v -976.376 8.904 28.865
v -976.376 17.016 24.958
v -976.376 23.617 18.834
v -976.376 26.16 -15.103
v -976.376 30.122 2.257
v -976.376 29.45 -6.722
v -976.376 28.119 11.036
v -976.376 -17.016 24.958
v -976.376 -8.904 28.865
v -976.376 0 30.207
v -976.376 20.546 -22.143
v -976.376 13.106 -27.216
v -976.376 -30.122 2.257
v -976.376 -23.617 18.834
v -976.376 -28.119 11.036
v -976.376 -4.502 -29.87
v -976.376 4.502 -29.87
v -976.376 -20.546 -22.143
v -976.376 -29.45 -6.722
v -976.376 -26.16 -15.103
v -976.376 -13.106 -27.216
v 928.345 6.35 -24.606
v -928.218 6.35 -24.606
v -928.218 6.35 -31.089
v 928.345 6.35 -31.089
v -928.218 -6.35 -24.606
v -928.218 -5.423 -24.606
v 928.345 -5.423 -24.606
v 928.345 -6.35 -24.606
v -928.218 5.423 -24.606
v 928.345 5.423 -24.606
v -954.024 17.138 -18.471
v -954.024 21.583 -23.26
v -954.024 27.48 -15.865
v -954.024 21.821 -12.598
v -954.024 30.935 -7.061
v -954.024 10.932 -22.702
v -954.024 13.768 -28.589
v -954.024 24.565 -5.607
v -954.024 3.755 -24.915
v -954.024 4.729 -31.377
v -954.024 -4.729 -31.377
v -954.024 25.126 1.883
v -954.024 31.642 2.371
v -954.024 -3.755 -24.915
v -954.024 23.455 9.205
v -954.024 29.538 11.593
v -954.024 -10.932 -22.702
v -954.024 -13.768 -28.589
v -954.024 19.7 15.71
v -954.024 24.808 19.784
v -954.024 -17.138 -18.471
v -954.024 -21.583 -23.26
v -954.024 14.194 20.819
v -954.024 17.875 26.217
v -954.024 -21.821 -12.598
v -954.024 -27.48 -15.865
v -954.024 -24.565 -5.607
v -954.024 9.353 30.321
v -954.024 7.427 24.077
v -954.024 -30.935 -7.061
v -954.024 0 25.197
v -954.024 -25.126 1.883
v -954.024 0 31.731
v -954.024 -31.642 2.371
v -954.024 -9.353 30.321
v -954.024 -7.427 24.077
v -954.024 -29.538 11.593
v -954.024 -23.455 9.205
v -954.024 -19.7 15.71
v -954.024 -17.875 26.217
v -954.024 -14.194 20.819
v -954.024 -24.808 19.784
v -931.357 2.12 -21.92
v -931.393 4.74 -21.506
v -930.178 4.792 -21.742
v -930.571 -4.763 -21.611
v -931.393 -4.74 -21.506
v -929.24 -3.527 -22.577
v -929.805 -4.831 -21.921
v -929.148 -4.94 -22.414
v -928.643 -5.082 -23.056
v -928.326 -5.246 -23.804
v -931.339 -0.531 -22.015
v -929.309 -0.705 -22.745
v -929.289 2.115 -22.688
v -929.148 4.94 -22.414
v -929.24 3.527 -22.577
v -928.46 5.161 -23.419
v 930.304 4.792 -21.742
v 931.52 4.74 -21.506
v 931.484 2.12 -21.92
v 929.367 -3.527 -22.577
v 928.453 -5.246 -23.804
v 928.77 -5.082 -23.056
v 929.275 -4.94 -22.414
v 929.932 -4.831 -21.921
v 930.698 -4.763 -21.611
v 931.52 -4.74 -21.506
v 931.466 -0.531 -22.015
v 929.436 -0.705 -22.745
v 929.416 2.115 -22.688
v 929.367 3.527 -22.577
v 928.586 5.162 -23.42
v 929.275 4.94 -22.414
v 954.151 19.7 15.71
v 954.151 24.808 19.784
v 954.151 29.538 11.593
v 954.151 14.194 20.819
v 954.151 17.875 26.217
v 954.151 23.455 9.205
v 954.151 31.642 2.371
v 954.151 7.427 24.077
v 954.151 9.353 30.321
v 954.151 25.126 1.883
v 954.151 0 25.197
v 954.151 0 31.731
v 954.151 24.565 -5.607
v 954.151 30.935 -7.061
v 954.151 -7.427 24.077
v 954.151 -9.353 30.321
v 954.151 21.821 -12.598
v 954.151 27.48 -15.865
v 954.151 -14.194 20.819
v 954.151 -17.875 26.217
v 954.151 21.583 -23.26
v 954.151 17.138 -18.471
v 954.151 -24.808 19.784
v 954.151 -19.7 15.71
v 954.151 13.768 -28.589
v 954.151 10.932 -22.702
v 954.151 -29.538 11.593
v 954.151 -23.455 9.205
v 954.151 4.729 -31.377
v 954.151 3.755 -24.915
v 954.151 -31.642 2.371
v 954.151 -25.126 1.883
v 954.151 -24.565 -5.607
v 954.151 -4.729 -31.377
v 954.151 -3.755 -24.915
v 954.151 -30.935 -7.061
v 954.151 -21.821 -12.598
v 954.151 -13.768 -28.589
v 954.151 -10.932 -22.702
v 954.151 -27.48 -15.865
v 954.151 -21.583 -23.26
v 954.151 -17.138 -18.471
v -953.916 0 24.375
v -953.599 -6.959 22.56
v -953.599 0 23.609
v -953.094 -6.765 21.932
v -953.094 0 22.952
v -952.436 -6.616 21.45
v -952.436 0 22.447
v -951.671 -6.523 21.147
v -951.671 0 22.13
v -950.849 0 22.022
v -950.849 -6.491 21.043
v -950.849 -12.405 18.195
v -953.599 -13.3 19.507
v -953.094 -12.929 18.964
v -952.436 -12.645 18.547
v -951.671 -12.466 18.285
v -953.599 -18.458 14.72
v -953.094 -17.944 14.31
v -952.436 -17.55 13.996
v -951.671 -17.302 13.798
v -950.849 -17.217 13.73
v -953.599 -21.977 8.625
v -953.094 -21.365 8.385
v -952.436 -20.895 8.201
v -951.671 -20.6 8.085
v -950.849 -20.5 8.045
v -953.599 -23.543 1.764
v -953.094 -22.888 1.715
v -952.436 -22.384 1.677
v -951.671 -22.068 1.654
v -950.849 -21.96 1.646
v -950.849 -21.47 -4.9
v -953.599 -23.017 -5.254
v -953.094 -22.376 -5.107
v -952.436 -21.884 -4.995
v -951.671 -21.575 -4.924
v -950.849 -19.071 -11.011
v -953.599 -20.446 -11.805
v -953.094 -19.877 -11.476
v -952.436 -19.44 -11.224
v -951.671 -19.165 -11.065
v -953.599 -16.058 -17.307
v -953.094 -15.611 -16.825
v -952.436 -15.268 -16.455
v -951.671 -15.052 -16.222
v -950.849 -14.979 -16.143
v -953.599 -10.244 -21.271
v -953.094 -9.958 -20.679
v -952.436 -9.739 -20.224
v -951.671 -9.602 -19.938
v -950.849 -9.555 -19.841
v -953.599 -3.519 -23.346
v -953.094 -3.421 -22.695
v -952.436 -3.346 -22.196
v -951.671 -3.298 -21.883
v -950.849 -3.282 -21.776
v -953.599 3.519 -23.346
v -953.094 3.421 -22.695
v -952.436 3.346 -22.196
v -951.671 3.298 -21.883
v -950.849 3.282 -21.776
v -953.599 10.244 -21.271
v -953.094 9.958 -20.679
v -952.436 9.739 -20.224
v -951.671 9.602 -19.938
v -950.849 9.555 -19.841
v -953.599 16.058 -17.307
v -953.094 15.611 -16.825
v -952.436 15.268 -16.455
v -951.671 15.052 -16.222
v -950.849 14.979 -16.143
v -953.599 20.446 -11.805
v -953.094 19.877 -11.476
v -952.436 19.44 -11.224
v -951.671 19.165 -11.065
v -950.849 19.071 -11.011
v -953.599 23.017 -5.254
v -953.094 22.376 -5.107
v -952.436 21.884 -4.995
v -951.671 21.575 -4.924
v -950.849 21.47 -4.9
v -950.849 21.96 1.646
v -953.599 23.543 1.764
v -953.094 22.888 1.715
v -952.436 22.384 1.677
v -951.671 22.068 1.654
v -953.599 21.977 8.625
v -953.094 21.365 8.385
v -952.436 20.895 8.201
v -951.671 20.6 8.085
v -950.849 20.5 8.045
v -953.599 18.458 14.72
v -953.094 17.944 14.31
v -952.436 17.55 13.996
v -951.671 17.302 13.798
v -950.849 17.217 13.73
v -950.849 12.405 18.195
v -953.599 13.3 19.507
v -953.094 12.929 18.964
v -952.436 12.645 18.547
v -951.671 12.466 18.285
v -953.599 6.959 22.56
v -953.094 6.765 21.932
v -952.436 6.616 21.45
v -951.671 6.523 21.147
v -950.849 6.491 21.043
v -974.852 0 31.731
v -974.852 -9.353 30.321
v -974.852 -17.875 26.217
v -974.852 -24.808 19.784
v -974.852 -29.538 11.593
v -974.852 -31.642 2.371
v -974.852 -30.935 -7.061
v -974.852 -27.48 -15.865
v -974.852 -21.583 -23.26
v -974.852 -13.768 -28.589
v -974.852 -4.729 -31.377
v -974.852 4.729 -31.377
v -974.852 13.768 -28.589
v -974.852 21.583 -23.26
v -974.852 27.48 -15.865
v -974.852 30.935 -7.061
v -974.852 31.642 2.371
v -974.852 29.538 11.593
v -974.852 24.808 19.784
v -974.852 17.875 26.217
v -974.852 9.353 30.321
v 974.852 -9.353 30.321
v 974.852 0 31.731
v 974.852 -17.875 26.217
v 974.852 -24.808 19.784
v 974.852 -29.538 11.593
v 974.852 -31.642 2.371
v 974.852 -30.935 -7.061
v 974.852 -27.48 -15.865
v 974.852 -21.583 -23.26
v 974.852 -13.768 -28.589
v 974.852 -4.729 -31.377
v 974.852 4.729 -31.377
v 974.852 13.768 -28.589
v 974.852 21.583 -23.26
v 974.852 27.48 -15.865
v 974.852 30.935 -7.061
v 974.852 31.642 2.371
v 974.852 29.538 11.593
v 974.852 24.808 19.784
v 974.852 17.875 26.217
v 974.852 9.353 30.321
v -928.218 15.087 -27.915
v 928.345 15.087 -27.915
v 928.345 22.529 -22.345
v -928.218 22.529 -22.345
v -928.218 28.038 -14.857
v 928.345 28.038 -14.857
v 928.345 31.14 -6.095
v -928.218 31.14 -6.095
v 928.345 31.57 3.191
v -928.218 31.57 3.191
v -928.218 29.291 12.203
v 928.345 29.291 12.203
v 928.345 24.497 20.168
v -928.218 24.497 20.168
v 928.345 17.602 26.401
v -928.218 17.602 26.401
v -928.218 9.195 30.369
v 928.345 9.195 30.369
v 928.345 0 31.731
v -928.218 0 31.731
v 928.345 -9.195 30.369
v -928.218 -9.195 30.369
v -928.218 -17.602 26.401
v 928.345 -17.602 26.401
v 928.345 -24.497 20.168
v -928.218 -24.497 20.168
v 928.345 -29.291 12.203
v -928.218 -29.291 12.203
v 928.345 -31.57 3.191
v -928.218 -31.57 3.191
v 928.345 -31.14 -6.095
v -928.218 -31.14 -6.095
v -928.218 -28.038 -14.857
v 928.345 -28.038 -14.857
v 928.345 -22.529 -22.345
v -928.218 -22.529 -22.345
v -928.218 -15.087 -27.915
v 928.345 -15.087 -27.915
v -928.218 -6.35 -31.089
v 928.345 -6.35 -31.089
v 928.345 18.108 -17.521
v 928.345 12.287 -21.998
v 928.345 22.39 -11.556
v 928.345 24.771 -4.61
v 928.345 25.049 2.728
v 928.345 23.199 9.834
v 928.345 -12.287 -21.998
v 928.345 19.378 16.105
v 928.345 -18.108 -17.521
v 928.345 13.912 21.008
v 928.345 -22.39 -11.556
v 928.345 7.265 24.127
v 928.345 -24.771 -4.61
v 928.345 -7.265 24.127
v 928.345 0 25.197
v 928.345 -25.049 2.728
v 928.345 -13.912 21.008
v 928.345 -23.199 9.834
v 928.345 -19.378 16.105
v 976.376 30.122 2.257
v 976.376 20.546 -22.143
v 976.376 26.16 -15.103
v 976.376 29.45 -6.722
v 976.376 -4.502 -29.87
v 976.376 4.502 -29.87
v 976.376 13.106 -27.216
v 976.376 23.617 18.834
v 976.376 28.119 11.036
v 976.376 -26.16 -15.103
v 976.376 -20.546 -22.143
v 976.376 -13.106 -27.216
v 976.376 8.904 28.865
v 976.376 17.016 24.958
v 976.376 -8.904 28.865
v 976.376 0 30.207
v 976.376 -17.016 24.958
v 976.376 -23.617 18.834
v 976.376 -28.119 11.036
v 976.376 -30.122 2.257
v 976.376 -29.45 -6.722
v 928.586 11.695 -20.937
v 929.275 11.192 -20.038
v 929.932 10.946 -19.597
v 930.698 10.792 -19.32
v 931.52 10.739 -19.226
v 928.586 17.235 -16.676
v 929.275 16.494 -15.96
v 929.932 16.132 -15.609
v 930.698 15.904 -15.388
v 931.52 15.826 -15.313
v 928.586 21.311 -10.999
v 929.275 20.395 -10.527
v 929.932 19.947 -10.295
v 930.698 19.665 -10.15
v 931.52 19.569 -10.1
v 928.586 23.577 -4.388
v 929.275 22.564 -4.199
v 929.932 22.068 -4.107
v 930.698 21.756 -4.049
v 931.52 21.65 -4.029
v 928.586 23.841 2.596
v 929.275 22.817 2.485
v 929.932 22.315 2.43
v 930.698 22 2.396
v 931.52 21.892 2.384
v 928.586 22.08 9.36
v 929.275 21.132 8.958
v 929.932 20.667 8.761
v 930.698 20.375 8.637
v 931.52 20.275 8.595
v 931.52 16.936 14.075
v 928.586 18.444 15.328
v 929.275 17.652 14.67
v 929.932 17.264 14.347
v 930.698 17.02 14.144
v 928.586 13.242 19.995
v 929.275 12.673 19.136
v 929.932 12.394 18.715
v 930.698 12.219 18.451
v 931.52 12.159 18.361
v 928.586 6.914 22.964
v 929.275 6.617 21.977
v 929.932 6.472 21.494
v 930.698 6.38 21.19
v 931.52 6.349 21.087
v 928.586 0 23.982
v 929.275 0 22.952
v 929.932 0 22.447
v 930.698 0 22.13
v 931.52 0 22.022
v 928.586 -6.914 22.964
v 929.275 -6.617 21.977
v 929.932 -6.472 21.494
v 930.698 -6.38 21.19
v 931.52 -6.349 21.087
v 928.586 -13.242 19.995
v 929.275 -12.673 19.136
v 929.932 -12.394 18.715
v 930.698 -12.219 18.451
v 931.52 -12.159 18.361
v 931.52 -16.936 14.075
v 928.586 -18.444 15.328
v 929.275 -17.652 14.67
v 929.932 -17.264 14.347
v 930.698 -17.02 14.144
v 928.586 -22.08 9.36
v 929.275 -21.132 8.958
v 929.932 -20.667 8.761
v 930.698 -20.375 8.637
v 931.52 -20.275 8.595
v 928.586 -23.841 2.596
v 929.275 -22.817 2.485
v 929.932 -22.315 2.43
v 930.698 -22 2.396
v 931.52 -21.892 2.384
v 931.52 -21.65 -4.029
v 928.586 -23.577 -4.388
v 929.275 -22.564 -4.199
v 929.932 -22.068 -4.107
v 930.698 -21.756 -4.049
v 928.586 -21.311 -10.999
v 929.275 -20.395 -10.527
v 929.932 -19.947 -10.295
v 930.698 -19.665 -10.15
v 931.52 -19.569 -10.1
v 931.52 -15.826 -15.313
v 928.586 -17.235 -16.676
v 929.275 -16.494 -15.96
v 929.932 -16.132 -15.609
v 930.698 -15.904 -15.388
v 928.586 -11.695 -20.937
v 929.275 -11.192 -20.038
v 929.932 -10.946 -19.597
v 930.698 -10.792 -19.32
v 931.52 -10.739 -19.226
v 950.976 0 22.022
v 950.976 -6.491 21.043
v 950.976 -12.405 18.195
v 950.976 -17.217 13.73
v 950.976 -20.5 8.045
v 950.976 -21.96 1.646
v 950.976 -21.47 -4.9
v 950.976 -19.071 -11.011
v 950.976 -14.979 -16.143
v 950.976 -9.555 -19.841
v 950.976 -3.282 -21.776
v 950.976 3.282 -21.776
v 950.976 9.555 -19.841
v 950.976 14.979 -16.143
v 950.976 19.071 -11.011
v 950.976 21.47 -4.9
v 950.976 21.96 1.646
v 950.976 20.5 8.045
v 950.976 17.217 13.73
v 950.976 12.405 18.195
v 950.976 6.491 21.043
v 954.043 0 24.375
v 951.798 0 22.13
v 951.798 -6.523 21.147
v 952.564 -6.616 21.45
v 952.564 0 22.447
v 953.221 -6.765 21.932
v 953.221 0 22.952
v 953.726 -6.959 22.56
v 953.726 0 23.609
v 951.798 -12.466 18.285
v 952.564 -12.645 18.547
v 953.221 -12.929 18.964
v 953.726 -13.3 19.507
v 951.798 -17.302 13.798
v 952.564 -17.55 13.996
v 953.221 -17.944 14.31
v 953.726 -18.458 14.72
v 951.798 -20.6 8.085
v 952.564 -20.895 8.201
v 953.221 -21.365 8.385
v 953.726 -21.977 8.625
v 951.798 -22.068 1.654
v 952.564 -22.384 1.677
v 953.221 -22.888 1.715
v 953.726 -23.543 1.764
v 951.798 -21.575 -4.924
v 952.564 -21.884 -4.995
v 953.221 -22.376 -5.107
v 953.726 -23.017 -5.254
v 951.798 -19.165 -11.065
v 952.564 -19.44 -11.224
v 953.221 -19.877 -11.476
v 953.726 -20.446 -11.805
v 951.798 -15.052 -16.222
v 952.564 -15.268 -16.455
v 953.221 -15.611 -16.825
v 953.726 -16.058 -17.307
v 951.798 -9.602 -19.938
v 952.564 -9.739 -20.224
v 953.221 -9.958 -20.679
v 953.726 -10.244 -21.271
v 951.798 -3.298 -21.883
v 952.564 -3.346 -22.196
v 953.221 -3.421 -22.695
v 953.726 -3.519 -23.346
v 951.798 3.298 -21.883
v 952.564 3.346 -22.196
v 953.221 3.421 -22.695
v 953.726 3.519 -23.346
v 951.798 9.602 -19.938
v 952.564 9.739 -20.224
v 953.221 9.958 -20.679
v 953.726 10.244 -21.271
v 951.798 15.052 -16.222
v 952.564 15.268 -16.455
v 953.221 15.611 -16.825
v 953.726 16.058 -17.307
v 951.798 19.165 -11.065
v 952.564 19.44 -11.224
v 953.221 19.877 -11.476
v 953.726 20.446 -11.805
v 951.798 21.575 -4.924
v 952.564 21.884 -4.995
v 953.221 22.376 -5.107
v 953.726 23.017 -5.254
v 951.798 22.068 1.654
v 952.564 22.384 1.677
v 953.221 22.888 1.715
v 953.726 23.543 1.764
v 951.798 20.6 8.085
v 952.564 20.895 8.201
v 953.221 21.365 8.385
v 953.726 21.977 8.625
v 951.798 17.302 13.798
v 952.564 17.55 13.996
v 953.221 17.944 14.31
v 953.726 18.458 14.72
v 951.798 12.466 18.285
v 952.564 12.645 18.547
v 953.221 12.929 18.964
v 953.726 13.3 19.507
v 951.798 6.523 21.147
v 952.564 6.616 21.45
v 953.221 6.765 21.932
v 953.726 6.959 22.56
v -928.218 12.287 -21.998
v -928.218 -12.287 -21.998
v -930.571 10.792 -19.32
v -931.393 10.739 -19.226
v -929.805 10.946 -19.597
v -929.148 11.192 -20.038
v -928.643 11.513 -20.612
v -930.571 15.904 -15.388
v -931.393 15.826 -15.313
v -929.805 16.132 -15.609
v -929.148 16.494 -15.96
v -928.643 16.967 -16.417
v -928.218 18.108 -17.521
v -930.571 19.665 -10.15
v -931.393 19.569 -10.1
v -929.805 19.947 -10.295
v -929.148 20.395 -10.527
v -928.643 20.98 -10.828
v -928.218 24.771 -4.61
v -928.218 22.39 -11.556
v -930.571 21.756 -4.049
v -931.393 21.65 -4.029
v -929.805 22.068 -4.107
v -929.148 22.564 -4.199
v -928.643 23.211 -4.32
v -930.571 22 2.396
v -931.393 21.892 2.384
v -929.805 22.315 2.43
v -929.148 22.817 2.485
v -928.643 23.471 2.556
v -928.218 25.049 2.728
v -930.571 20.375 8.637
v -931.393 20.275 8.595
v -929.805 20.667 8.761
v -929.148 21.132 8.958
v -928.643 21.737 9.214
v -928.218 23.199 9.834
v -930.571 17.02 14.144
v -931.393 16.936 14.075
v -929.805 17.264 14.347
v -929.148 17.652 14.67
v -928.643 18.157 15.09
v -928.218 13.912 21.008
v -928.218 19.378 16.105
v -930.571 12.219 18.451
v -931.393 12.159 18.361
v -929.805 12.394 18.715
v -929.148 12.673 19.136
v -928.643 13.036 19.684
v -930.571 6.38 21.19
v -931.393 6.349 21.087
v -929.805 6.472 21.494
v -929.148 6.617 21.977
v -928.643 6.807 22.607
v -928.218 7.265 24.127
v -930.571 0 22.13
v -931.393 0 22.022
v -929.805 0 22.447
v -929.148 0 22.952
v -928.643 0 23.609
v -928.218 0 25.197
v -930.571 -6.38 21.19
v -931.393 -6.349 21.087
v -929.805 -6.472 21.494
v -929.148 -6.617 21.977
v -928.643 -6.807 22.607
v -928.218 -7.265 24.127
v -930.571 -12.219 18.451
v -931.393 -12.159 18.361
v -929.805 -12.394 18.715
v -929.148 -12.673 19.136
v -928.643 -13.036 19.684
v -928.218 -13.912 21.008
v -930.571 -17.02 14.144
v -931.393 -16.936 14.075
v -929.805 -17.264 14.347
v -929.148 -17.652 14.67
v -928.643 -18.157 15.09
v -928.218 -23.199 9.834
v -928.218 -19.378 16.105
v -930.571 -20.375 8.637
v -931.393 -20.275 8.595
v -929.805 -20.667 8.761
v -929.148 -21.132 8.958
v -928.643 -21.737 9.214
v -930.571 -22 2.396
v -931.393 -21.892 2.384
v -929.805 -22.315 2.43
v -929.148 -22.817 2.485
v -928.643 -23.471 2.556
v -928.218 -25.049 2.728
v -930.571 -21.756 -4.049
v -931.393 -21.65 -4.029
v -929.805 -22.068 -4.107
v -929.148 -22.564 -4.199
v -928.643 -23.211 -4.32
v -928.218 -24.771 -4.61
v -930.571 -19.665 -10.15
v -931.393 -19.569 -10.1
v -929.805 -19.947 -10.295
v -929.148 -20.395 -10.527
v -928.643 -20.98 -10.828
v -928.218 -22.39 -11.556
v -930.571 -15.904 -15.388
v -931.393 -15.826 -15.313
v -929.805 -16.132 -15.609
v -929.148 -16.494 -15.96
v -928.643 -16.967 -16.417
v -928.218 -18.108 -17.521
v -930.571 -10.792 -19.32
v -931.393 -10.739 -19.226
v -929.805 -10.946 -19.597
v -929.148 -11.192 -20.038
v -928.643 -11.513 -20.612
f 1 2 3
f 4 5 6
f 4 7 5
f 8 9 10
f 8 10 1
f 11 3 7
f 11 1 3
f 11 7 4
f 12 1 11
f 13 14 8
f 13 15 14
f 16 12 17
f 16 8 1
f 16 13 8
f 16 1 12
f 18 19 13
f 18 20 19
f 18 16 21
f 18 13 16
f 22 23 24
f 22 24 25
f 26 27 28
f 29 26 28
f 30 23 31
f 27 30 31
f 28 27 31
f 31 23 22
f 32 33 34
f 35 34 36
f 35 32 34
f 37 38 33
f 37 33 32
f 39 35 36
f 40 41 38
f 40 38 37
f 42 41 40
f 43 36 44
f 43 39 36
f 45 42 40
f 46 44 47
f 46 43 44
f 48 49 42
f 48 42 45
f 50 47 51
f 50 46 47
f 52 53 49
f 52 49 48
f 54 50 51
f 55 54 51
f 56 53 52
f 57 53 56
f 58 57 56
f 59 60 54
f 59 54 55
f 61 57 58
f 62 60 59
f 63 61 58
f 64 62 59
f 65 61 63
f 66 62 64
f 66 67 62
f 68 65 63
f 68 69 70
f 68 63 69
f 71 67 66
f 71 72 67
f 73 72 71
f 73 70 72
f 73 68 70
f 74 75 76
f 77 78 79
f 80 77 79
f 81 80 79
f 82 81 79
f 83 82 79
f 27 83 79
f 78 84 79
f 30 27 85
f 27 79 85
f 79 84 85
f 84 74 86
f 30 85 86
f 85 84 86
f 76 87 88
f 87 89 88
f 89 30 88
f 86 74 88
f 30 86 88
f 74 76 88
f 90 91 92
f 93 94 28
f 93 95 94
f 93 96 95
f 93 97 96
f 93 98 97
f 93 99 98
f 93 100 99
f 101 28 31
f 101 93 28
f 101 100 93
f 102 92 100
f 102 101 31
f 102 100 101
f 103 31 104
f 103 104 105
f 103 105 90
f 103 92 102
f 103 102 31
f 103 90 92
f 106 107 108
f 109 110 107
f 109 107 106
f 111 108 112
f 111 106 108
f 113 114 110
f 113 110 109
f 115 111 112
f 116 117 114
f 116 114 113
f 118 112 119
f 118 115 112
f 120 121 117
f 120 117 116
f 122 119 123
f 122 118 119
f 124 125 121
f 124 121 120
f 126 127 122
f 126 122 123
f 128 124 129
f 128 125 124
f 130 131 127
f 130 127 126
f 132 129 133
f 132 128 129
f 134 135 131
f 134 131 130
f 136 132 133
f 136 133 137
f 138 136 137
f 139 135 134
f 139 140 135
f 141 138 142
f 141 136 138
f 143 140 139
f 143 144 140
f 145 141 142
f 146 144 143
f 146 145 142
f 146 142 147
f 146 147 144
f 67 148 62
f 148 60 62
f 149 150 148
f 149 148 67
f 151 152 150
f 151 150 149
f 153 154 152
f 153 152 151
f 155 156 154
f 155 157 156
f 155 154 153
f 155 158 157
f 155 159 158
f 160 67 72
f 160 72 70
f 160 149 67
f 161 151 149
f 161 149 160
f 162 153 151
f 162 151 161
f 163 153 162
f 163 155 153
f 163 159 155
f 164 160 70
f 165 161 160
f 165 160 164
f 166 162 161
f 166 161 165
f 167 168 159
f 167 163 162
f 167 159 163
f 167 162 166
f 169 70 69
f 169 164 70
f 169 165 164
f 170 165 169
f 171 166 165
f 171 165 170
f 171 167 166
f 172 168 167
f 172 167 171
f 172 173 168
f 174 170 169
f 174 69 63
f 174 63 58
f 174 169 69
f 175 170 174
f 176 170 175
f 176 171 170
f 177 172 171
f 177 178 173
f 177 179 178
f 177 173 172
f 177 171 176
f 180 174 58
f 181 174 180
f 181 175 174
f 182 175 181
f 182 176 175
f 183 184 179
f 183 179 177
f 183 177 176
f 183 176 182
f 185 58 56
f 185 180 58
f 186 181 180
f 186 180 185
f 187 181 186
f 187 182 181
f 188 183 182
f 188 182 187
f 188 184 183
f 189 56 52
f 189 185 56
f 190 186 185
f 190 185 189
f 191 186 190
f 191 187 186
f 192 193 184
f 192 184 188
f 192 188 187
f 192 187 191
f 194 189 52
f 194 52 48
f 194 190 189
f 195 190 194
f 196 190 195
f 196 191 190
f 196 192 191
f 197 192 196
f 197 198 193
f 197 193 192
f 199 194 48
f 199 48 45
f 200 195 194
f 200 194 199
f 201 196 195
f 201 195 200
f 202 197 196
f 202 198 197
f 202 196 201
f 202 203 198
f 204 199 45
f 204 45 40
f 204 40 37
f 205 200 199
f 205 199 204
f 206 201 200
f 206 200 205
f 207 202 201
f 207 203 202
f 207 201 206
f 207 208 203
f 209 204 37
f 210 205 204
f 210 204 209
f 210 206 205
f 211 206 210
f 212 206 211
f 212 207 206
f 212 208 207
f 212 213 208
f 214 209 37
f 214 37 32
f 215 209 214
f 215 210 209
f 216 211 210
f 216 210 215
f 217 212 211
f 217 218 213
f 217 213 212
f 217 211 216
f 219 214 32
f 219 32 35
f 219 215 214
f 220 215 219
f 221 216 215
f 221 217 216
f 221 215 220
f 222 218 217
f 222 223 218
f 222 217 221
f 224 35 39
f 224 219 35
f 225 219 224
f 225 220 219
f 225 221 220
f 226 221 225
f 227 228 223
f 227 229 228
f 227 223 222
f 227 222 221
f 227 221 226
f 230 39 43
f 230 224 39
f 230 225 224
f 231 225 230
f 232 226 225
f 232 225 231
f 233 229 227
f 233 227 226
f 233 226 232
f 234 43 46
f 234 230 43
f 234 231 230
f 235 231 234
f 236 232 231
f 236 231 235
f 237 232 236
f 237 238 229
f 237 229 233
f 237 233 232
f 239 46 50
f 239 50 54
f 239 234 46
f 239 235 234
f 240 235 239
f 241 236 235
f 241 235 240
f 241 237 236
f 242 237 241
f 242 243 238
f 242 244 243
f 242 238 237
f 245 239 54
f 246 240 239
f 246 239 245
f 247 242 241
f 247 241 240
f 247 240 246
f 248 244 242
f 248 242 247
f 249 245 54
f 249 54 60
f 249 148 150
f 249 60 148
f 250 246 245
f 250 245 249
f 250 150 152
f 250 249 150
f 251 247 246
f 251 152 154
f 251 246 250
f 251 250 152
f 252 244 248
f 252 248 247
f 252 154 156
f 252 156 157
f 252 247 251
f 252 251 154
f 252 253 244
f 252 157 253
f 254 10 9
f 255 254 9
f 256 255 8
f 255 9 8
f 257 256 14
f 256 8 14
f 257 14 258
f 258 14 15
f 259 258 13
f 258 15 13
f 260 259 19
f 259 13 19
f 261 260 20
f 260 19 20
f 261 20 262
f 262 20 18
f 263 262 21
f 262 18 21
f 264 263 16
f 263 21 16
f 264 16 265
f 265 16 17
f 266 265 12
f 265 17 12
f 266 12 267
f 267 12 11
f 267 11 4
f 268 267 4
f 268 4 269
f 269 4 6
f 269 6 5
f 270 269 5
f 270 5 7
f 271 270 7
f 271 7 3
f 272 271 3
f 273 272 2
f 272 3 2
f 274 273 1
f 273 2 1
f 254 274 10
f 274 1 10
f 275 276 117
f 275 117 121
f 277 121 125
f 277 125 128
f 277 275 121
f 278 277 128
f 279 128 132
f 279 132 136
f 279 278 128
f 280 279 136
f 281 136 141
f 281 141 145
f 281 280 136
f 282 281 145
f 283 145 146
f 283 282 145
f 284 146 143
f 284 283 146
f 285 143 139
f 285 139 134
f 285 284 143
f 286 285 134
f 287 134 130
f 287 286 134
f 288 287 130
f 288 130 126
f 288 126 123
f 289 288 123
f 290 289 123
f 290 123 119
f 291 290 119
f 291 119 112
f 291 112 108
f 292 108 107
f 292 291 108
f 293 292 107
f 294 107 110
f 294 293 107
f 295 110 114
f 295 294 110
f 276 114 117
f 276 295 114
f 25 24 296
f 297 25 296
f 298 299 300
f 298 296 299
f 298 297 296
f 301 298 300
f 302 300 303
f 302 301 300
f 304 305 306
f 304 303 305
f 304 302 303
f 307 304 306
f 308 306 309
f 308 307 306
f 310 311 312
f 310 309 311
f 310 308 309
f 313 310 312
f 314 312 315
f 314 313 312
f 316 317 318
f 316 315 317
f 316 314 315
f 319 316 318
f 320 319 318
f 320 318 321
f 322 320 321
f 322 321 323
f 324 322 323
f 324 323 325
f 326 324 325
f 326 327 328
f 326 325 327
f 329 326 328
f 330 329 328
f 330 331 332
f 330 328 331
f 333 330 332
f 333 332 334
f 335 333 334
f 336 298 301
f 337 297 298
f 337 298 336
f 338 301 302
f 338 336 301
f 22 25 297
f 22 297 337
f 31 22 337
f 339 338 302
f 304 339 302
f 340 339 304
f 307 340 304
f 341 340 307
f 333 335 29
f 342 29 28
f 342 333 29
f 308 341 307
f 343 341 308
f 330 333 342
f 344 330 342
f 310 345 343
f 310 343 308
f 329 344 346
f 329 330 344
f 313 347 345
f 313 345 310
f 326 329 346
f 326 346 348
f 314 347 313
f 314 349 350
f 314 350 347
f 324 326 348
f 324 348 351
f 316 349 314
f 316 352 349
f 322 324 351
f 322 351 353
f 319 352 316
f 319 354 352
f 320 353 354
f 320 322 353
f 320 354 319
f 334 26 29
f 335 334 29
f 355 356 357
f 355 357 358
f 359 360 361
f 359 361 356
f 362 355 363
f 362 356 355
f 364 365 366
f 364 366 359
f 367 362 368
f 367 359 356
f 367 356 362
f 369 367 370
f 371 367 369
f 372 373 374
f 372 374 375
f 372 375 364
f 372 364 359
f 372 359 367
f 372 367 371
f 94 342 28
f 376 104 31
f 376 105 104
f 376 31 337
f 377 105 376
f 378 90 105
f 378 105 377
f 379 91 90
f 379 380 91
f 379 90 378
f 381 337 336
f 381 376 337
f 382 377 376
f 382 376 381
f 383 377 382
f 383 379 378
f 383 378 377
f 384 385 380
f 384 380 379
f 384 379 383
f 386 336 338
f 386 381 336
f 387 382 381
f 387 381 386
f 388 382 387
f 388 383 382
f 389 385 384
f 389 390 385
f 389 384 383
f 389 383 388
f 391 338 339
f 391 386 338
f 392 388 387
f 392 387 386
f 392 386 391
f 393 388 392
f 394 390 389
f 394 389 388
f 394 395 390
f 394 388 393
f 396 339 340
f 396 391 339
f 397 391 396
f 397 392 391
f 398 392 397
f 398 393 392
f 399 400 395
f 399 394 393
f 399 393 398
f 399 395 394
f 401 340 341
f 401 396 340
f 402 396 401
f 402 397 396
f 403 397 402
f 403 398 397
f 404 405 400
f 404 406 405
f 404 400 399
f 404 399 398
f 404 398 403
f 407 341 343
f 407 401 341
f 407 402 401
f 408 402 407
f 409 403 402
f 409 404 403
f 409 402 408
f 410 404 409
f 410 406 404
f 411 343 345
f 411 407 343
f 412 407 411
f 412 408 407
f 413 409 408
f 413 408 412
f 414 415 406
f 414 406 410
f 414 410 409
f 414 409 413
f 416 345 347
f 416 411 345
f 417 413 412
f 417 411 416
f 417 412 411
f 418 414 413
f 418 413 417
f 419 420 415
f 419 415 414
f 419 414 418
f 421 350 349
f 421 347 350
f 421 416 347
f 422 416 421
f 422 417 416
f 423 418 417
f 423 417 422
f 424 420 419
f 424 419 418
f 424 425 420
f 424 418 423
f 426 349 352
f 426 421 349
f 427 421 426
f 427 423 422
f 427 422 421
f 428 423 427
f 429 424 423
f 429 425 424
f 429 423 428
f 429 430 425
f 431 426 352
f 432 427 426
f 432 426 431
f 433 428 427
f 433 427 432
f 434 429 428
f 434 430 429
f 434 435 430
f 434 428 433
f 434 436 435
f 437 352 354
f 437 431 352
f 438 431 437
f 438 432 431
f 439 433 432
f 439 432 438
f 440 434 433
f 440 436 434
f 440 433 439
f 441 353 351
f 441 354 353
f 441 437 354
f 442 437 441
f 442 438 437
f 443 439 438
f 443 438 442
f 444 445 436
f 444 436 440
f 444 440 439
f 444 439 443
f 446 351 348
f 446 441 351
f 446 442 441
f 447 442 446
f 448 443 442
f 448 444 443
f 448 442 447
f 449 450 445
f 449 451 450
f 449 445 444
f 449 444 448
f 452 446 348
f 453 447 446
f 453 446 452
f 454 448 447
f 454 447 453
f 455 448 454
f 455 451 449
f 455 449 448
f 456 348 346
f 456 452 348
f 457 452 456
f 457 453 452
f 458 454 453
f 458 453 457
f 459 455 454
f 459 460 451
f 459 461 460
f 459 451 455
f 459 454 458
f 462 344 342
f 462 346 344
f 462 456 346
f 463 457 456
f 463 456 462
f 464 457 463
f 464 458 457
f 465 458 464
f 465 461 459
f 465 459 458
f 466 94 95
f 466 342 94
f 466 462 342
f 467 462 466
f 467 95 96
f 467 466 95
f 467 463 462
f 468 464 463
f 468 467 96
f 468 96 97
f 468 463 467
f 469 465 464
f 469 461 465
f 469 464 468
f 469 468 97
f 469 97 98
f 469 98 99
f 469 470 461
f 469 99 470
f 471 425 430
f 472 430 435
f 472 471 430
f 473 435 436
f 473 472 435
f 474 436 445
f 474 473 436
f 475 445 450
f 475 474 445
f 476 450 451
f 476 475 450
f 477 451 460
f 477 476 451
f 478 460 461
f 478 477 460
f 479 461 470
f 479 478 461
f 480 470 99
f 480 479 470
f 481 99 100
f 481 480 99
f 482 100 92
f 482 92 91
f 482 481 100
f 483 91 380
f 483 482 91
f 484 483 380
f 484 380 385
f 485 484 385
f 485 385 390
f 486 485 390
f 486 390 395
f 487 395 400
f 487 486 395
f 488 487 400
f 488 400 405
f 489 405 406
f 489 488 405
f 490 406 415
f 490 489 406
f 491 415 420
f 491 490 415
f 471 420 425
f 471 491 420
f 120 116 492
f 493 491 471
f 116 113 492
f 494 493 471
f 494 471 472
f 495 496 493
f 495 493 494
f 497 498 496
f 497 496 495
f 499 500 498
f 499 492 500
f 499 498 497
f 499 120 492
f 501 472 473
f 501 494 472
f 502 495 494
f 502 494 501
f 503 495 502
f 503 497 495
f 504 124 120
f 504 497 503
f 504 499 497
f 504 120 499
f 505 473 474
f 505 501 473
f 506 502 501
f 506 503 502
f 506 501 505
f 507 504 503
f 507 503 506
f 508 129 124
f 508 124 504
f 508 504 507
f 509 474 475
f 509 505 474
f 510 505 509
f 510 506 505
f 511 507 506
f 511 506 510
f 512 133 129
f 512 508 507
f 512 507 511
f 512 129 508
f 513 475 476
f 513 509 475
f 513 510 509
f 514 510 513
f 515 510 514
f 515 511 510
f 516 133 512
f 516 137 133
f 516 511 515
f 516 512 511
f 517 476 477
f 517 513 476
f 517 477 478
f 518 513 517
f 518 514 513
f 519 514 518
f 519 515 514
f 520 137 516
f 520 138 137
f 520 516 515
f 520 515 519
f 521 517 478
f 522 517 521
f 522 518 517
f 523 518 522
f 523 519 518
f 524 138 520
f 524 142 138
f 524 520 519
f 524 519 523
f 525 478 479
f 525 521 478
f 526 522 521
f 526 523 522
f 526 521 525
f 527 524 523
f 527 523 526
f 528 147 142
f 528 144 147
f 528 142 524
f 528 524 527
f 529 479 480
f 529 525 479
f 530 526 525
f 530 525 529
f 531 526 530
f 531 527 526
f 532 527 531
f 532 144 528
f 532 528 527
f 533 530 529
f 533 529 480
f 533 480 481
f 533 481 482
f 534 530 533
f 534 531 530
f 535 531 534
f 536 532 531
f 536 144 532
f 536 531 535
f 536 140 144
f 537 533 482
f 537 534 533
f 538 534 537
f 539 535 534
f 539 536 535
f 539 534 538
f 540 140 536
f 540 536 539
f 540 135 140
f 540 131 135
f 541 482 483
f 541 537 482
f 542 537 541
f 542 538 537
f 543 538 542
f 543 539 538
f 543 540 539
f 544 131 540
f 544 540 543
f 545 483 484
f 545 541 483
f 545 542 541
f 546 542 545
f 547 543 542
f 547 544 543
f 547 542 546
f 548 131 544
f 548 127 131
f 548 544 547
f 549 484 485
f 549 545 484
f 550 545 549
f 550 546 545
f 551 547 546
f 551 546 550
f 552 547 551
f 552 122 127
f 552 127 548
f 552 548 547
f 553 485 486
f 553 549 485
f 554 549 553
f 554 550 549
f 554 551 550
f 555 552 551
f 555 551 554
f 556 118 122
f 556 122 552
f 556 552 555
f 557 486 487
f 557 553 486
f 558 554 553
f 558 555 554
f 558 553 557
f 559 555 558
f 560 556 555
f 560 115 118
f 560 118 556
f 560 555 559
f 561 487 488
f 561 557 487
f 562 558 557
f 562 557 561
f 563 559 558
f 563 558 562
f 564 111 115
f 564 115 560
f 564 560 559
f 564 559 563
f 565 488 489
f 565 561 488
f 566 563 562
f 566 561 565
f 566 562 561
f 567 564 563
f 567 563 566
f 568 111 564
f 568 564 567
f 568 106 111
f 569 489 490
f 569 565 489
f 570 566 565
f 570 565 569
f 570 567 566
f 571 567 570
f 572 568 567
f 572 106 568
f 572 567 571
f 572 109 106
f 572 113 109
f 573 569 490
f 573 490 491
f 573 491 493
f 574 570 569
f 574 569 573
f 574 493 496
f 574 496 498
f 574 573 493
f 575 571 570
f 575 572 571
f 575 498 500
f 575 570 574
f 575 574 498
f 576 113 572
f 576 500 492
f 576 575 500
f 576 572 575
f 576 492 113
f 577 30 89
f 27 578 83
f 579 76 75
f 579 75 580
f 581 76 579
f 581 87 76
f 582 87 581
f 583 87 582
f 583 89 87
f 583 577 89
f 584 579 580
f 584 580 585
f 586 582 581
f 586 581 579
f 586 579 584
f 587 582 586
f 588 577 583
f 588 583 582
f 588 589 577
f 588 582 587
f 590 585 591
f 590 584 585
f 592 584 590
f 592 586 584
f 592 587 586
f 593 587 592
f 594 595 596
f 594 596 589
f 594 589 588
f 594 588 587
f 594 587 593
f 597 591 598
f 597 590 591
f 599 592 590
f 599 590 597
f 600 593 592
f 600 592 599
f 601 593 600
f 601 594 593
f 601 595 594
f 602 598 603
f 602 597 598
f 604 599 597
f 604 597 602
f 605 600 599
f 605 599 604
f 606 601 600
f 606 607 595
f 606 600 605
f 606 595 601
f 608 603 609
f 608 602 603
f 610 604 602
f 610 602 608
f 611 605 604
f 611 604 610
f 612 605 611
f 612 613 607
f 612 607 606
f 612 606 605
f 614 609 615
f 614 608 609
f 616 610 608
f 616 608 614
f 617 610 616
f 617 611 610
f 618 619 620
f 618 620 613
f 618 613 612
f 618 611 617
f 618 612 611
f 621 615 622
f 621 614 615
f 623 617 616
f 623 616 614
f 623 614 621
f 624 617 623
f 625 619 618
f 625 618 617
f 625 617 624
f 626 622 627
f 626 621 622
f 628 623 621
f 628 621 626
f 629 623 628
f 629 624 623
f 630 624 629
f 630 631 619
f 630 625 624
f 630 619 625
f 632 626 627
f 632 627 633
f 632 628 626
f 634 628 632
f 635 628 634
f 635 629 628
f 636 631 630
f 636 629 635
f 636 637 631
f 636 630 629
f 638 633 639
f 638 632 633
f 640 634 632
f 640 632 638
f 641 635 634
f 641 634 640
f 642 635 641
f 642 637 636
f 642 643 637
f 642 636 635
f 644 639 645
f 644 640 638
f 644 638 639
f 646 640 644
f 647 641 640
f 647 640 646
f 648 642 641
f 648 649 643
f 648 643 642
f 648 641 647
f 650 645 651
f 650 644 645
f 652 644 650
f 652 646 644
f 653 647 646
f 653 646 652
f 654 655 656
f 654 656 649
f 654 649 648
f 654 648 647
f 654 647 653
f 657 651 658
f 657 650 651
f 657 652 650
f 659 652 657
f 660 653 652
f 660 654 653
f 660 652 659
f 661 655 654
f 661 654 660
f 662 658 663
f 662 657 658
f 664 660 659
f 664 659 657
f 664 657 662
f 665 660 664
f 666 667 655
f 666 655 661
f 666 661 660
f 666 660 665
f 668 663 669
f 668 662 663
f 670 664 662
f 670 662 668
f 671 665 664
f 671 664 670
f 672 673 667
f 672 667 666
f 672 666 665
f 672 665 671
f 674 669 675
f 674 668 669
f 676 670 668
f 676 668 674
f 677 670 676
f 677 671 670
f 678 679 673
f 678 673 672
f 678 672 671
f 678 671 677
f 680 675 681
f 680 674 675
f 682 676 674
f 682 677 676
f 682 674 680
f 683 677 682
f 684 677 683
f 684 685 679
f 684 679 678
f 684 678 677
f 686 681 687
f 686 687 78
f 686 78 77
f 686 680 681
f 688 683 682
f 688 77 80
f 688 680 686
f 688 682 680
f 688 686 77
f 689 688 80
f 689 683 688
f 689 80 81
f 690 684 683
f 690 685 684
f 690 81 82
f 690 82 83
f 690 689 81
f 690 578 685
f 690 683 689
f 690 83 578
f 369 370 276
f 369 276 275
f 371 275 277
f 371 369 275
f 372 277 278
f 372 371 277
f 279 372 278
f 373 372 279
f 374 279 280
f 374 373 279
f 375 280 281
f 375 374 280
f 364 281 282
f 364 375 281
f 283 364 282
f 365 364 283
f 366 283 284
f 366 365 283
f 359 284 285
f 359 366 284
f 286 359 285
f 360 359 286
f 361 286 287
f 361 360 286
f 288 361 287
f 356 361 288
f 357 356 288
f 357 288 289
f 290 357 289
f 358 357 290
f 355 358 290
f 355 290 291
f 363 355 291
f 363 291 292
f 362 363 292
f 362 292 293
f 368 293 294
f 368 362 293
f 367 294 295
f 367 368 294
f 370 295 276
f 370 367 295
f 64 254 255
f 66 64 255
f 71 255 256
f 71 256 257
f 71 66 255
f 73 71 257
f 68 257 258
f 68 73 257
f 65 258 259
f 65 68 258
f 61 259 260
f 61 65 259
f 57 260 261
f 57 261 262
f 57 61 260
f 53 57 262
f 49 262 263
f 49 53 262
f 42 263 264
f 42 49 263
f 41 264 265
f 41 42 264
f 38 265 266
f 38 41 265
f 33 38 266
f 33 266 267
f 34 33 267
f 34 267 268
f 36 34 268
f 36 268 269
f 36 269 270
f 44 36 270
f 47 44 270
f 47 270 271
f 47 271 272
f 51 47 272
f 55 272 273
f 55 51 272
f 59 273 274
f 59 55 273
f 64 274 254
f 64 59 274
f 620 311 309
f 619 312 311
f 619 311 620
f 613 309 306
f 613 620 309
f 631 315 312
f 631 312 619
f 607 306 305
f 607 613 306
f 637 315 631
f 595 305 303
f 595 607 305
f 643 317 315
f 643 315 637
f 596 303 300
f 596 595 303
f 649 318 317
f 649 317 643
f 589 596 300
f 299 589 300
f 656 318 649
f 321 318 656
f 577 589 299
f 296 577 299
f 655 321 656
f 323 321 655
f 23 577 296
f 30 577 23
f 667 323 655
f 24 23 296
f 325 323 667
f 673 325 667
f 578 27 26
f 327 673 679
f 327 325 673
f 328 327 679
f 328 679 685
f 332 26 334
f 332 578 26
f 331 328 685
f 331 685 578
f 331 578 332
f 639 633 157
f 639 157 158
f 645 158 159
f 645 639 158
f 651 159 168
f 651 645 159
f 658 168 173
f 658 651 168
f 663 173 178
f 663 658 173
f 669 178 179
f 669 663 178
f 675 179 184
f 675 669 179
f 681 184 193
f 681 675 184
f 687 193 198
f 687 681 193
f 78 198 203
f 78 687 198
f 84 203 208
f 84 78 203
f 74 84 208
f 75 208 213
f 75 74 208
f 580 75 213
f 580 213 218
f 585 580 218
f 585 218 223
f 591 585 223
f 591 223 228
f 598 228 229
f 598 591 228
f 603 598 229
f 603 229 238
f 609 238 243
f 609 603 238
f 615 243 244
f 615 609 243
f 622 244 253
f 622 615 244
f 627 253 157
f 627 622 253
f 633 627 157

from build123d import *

# Parameters (mm, degrees)
CUT_EXTRUDE2_START = -24.60625
SKETCH2_W          = 1882.3686
SKETCH2_H          = 12.7
CUT_EXTRUDE2_DEPTH = 63.4619
FILLET1_R          = 3.175
CHAMFER1_SIZE      = 1.524


with BuildPart() as part:
    # Sketch1 → Revolve1 (revolve)
    with BuildSketch(Plane(origin=(0, 0, 0), x_dir=(1, 0, 0), z_dir=(0, 1, 0)), mode=Mode.PRIVATE) as revolve1_sk:
        Polygon((-976.376, 0), (-976.376, 31.73095), (-954.024, 31.73095), (-954.024, 22.0218), (-928.2176, 22.0218), (-928.2176, 31.73095), (928.3446, 31.73095), (928.3446, 22.0218), (954.151, 22.0218), (954.151, 31.73095), (976.376, 31.73095), (976.376, 0), align=None)
    revolve(revolve1_sk.sketch.rotate(Axis((-1001.776, 0, 0), (1, 0, 0)), 180), axis=Axis((-1001.776, 0, 0), (1, 0, 0)))

    # Sketch2 → Cut-Extrude2 (cut)
    with BuildSketch(Plane.XY.offset(CUT_EXTRUDE2_START)):
        with Locations((0.0635, 0)):
            Rectangle(SKETCH2_W, SKETCH2_H)
    extrude(amount=-CUT_EXTRUDE2_DEPTH, mode=Mode.SUBTRACT)

    # Fillet1
    fillet1_edges = [part.edges().sort_by_distance(p)[0] for p in [
        (954.151, 0, -22.0218),
        (928.3446, 0, -22.0218),
        (-928.2176, 0, -22.0218),
        (-954.024, 0, -22.0218),
    ]]
    fillet(fillet1_edges, radius=FILLET1_R)

    # Chamfer1
    chamfer1_edges = [part.edges().sort_by_distance(p)[0] for p in [
        (-976.376, 0, -31.73095),
        (976.376, 0, -31.73095),
    ]]
    chamfer(chamfer1_edges, length=CHAMFER1_SIZE)


solid = part.part
